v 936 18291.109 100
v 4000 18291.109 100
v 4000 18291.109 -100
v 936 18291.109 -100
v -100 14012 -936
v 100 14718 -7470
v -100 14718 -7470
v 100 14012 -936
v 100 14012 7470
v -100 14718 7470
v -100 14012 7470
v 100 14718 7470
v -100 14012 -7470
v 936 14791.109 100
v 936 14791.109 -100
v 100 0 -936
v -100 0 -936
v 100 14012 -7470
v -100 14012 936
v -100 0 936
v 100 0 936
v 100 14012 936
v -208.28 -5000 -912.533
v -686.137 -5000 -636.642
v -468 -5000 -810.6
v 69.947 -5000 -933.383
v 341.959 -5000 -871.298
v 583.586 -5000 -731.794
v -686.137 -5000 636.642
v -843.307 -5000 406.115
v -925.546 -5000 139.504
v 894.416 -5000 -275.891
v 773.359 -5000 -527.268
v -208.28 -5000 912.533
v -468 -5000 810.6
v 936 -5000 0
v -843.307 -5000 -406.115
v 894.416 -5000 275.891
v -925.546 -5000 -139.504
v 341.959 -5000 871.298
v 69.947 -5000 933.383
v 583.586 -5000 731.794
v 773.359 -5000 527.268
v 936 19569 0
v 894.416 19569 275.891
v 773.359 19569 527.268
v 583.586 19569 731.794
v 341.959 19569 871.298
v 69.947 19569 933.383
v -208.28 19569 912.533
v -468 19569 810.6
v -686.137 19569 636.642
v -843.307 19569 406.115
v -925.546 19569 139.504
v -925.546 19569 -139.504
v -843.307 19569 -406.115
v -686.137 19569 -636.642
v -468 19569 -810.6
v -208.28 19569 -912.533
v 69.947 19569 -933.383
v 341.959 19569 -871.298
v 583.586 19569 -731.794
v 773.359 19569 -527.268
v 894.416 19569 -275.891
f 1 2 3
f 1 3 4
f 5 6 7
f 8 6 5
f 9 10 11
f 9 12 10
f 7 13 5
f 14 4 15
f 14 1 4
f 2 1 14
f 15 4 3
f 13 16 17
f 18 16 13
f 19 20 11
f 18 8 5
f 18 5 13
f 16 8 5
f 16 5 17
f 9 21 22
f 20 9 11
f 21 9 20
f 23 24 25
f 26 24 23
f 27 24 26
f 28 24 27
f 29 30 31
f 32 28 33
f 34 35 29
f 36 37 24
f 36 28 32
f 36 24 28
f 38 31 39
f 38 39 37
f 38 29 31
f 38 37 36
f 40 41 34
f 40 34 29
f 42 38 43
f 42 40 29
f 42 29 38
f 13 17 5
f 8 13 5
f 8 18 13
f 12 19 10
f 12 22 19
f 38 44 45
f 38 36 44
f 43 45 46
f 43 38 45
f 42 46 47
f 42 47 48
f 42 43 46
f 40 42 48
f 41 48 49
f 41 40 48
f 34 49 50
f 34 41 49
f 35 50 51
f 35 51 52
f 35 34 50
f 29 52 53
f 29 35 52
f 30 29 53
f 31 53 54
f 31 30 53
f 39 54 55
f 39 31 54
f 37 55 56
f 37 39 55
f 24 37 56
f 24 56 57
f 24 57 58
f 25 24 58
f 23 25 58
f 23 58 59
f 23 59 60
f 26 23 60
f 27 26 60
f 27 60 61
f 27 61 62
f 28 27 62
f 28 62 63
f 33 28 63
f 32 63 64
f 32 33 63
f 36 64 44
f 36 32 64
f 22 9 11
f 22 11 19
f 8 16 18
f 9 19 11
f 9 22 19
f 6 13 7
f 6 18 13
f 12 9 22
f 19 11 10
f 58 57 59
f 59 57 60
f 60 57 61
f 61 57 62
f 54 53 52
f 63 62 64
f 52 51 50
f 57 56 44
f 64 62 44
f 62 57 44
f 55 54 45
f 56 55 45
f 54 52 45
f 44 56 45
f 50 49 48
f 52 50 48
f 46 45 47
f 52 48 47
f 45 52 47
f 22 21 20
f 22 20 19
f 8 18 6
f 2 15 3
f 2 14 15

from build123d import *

# Parameters (mm, degrees)
F0_R      = 936
F3_DEPTH  = 14012
F4_DEPTH  = 100
F5_DEPTH  = 100
F6_DEPTH  = 5000
F7_DEPTH  = 5557
F11_DEPTH = 100


# Not quite as in the source:
# - the program builds the solid bodies; features that only make, move or delete a surface that nothing else refers to are left out


with BuildPart() as f3:
    # F0 (on Front) → F3 (new body)
    with BuildSketch(Plane.XZ):
        Circle(F0_R)
    extrude(amount=-F3_DEPTH)

    # F6 (add): a face of the model
    f6_faces = [f3.faces().sort_by_distance(p)[0] for p in [
        (0, 0, 0),
    ]]
    extrude(f6_faces, amount=F6_DEPTH)

    # F7 (add): a face of the model
    f7_faces = [f3.faces().sort_by_distance(p)[0] for p in [
        (0, 14012, 0),
    ]]
    extrude(f7_faces, amount=F7_DEPTH)


with BuildPart() as f4:
    # F1 (on Right) → F4 (new body, symmetric)
    with BuildSketch(Plane.YZ):
        Polygon((14012, 7470), (0, 936), (14012, 936), align=None)
    extrude(amount=F4_DEPTH, both=True)


with BuildPart() as f4b:
    # F1 (on Right) → F4, piece 2 (new body, symmetric)
    with BuildSketch(Plane.YZ):
        Polygon((14012, -7470), (14012, -936), (0, -936), align=None)
    extrude(amount=F4_DEPTH, both=True)


with BuildPart() as f5:
    # F2 (on Right) → F5 (new body, symmetric)
    with BuildSketch(Plane.YZ):
        Polygon((14718, 7470), (14012, 7470), (14012, 936), align=None)
    extrude(amount=F5_DEPTH, both=True)


with BuildPart() as f5b:
    # F2 (on Right) → F5, piece 2 (new body, symmetric)
    with BuildSketch(Plane.YZ):
        Polygon((14718, -7470), (14012, -936), (14012, -7470), align=None)
    extrude(amount=F5_DEPTH, both=True)


with BuildPart() as f11:
    # F10 (on Top) → F11 (new body, symmetric)
    with BuildSketch(Plane.XY):
        Polygon((936, 14791.109085083), (4000, 18291.109085083), (936, 18291.109085083), align=None)
    extrude(amount=F11_DEPTH, both=True)


solid = Compound([f3.part, f4.part, f4b.part, f5.part, f5b.part, f11.part])
